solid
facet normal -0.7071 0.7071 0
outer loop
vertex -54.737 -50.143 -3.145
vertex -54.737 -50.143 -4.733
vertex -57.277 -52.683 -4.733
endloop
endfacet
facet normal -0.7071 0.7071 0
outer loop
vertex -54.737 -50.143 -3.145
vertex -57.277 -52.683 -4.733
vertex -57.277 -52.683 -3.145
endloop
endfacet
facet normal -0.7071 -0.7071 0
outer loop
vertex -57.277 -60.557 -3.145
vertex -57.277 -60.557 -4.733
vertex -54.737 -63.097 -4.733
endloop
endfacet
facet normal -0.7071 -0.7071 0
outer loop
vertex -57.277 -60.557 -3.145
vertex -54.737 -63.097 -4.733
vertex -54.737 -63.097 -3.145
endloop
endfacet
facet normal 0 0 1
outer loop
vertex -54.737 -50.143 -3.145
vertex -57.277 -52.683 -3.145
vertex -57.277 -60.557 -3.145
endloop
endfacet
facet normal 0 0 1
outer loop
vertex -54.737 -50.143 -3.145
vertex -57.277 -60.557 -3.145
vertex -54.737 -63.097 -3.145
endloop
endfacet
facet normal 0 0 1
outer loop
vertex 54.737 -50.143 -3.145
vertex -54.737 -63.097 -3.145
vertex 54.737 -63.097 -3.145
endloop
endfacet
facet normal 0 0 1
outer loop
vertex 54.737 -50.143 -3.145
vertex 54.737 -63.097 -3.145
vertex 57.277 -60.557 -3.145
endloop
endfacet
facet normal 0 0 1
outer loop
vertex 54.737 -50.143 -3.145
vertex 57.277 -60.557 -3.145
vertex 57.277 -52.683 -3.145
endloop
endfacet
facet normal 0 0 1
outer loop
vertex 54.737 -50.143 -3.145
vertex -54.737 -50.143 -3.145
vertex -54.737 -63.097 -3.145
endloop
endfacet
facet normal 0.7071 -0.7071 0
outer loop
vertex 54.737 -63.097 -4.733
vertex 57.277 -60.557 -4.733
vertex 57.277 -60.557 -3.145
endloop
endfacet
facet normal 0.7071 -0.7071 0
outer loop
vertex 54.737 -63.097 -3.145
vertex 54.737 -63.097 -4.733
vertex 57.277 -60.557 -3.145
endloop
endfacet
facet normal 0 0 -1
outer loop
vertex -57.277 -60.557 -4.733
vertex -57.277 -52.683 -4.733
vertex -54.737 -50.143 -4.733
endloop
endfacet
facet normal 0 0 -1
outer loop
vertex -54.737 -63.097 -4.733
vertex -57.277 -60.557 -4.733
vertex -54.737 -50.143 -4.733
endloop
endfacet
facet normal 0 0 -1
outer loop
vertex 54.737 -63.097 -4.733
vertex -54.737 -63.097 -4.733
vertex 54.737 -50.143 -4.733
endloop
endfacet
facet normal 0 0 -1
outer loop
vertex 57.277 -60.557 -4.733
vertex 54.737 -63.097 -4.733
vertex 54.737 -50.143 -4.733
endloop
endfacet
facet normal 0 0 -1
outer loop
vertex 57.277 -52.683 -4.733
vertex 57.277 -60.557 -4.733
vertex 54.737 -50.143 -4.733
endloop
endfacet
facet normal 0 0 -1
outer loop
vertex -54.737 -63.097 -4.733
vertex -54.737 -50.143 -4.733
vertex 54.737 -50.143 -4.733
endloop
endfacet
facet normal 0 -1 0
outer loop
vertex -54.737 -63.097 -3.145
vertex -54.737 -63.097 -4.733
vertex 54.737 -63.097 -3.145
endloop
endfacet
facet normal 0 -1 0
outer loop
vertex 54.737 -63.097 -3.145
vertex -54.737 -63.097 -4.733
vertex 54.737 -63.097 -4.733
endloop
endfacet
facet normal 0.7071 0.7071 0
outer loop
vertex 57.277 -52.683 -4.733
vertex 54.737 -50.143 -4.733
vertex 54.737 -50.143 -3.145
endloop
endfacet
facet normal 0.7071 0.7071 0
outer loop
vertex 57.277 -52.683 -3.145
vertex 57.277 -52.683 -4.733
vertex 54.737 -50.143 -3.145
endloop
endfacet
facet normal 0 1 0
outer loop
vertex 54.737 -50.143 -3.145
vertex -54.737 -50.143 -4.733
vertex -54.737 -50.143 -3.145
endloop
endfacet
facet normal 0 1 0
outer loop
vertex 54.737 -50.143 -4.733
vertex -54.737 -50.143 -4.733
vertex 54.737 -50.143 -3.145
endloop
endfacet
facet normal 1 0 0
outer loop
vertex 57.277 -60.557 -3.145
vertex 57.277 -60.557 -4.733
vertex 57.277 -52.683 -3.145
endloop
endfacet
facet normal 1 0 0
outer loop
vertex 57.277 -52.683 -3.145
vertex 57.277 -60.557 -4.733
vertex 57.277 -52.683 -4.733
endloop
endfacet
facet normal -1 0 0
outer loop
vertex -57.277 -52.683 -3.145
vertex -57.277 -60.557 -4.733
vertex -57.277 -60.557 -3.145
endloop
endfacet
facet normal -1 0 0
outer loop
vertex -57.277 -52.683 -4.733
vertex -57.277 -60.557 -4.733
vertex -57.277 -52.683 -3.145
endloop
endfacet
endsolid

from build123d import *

# Parameters (mm, degrees)
SKETCH2_W           = 114.554000508
SKETCH2_H           = 12.954
BOSS_EXTRUDE1_DEPTH = 1.5875
CHAMFER1_SIZE       = 2.54


with BuildPart() as part:
    # Sketch2 → Boss-Extrude1 (new body)
    with BuildSketch(Plane.XY.offset(-4.7327)):
        with Locations((2.54e-07, -56.6198797)):
            Rectangle(SKETCH2_W, SKETCH2_H)
    extrude(amount=BOSS_EXTRUDE1_DEPTH)

    # Chamfer1
    chamfer1_edges = [part.edges().sort_by_distance(p)[0] for p in [
        (-57.277, -50.1428797, -3.93895),
        (57.277000508, -50.1428797, -3.93895),
        (57.277000508, -63.0968797, -3.93895),
        (-57.277, -63.0968797, -3.93895),
    ]]
    chamfer(chamfer1_edges, length=CHAMFER1_SIZE)


solid = part.part
